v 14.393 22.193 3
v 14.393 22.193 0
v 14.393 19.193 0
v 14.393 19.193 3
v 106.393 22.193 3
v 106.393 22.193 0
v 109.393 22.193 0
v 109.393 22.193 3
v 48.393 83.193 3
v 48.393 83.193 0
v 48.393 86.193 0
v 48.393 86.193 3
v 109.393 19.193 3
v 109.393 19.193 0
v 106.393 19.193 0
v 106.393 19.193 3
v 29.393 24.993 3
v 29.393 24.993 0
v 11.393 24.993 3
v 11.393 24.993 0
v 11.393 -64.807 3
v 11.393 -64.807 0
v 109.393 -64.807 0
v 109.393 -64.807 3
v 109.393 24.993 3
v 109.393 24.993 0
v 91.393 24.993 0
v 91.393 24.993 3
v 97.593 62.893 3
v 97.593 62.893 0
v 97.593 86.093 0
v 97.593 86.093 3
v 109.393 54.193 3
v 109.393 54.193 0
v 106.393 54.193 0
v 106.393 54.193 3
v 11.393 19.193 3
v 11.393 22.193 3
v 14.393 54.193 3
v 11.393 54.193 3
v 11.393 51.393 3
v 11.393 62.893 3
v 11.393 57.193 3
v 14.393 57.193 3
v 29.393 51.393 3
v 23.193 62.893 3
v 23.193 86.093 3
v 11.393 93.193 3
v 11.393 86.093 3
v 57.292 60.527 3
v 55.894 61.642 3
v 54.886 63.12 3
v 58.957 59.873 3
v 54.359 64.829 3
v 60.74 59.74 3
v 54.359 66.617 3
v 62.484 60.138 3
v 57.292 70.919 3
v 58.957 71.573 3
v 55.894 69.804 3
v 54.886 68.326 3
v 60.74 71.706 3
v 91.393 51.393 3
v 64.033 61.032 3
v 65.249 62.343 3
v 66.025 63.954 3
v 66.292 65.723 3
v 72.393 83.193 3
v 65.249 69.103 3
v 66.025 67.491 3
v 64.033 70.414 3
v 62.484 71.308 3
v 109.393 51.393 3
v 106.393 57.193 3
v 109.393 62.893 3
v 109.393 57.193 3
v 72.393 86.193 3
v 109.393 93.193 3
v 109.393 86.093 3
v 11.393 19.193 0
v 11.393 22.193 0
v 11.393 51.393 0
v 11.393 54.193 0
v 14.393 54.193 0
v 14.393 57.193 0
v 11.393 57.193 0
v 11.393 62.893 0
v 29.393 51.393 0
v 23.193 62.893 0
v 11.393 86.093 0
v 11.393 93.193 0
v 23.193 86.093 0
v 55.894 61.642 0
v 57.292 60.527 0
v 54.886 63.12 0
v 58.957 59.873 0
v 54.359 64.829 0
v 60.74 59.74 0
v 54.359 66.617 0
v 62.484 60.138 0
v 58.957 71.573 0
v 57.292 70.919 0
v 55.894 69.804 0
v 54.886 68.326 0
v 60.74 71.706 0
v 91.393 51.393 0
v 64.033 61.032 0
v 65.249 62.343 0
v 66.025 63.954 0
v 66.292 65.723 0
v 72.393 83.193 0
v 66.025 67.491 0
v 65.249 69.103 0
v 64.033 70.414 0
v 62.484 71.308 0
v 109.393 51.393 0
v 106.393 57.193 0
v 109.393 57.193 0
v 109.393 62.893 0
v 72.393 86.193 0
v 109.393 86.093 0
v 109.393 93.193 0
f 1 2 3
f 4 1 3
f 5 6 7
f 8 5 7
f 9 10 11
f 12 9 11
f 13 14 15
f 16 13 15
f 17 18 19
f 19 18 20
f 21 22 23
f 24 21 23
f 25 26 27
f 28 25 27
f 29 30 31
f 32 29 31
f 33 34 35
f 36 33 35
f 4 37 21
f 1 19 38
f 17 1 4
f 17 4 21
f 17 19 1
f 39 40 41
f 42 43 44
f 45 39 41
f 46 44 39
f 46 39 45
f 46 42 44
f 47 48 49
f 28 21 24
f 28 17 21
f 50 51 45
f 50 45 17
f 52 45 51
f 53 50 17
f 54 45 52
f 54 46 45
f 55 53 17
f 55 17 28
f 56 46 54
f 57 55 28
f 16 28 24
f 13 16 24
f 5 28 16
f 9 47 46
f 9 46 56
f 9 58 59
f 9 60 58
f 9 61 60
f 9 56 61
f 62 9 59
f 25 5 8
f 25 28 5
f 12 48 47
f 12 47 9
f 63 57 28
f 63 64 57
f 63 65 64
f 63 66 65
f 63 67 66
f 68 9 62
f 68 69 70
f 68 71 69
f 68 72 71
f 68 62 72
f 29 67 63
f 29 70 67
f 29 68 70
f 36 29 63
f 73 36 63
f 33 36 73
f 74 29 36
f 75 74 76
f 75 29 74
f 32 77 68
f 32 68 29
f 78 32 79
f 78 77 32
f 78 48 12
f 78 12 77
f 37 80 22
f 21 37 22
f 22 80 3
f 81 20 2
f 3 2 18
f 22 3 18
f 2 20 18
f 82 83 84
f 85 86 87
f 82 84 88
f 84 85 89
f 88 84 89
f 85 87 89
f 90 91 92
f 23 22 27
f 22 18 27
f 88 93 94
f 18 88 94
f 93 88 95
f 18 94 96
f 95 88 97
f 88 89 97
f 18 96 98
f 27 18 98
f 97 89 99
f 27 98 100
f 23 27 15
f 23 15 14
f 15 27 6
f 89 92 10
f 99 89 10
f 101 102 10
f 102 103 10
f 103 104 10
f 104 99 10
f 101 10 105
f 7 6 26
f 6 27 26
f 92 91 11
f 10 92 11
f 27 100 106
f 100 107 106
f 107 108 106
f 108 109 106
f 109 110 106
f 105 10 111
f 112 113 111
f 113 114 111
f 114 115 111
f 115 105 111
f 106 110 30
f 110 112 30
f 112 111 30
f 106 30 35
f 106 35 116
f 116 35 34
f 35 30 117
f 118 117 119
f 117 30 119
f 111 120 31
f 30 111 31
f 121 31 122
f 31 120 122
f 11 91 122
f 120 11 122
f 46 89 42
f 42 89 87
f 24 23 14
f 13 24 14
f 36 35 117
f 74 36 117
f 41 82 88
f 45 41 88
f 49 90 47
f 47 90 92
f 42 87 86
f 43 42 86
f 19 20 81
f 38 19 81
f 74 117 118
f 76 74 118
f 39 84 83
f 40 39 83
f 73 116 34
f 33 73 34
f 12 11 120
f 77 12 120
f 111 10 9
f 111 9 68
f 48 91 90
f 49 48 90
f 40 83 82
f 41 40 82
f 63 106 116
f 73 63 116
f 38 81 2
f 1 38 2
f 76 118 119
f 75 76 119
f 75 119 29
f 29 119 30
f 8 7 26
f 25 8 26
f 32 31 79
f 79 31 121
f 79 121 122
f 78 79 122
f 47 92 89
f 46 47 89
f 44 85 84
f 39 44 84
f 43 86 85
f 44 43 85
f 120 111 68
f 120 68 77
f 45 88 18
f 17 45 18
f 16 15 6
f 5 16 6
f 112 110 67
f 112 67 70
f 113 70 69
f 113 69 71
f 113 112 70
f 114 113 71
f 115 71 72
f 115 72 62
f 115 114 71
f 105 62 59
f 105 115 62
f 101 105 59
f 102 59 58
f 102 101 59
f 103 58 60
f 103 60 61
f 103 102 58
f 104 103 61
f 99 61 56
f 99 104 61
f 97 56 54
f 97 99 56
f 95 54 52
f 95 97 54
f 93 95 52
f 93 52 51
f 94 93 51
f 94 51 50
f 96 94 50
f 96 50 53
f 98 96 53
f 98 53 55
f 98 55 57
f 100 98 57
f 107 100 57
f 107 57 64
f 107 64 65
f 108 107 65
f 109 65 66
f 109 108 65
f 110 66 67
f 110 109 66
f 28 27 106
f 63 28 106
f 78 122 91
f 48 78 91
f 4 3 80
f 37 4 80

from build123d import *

# Parameters (mm, degrees)
MODEL_R                 = 6
MODEL_W                 = 24
MODEL_H                 = 3
SALIENTE_EXTRUIR1_DEPTH = 3


with BuildPart() as part:
    # Model → Saliente-Extruir1 (new body)
    with BuildSketch(Plane.XY):
        Polygon((11.392528896, 93.193403392), (11.392528896, 86.093403392), (23.192528896, 86.093403392), (23.192528896, 62.893403392), (11.392528896, 62.893403392), (11.392528896, 57.193403392), (14.392528896, 57.193403392), (14.392528896, 54.193403392), (11.392528896, 54.193403392), (11.392528896, 51.393403392), (29.392528896, 51.393403392), (29.392528896, 24.993403392), (11.392528896, 24.993403392), (11.392528896, 22.193403392), (14.392528896, 22.193403392), (14.392528896, 19.193403392), (11.392528896, 19.193403392), (11.392528896, -64.806596608), (109.392528896, -64.806596608), (109.392528896, 19.193403392), (106.392528896, 19.193403392), (106.392528896, 22.193403392), (109.392528896, 22.193403392), (109.392528896, 24.993403392), (91.392528896, 24.993403392), (91.392528896, 51.393403392), (109.392528896, 51.393403392), (109.392528896, 54.193403392), (106.392528896, 54.193403392), (106.392528896, 57.193403392), (109.392528896, 57.193403392), (109.392528896, 62.893403392), (97.592528896, 62.893403392), (97.592528896, 86.093403392), (109.392528896, 86.093403392), (109.392528896, 93.193403392), align=None)
        with Locations((60.291833129, 65.722966384)):
            Circle(MODEL_R, mode=Mode.SUBTRACT)
        with Locations((60.392528896, 84.693403392)):
            Rectangle(MODEL_W, MODEL_H, mode=Mode.SUBTRACT)
    extrude(amount=SALIENTE_EXTRUIR1_DEPTH)


solid = part.part
